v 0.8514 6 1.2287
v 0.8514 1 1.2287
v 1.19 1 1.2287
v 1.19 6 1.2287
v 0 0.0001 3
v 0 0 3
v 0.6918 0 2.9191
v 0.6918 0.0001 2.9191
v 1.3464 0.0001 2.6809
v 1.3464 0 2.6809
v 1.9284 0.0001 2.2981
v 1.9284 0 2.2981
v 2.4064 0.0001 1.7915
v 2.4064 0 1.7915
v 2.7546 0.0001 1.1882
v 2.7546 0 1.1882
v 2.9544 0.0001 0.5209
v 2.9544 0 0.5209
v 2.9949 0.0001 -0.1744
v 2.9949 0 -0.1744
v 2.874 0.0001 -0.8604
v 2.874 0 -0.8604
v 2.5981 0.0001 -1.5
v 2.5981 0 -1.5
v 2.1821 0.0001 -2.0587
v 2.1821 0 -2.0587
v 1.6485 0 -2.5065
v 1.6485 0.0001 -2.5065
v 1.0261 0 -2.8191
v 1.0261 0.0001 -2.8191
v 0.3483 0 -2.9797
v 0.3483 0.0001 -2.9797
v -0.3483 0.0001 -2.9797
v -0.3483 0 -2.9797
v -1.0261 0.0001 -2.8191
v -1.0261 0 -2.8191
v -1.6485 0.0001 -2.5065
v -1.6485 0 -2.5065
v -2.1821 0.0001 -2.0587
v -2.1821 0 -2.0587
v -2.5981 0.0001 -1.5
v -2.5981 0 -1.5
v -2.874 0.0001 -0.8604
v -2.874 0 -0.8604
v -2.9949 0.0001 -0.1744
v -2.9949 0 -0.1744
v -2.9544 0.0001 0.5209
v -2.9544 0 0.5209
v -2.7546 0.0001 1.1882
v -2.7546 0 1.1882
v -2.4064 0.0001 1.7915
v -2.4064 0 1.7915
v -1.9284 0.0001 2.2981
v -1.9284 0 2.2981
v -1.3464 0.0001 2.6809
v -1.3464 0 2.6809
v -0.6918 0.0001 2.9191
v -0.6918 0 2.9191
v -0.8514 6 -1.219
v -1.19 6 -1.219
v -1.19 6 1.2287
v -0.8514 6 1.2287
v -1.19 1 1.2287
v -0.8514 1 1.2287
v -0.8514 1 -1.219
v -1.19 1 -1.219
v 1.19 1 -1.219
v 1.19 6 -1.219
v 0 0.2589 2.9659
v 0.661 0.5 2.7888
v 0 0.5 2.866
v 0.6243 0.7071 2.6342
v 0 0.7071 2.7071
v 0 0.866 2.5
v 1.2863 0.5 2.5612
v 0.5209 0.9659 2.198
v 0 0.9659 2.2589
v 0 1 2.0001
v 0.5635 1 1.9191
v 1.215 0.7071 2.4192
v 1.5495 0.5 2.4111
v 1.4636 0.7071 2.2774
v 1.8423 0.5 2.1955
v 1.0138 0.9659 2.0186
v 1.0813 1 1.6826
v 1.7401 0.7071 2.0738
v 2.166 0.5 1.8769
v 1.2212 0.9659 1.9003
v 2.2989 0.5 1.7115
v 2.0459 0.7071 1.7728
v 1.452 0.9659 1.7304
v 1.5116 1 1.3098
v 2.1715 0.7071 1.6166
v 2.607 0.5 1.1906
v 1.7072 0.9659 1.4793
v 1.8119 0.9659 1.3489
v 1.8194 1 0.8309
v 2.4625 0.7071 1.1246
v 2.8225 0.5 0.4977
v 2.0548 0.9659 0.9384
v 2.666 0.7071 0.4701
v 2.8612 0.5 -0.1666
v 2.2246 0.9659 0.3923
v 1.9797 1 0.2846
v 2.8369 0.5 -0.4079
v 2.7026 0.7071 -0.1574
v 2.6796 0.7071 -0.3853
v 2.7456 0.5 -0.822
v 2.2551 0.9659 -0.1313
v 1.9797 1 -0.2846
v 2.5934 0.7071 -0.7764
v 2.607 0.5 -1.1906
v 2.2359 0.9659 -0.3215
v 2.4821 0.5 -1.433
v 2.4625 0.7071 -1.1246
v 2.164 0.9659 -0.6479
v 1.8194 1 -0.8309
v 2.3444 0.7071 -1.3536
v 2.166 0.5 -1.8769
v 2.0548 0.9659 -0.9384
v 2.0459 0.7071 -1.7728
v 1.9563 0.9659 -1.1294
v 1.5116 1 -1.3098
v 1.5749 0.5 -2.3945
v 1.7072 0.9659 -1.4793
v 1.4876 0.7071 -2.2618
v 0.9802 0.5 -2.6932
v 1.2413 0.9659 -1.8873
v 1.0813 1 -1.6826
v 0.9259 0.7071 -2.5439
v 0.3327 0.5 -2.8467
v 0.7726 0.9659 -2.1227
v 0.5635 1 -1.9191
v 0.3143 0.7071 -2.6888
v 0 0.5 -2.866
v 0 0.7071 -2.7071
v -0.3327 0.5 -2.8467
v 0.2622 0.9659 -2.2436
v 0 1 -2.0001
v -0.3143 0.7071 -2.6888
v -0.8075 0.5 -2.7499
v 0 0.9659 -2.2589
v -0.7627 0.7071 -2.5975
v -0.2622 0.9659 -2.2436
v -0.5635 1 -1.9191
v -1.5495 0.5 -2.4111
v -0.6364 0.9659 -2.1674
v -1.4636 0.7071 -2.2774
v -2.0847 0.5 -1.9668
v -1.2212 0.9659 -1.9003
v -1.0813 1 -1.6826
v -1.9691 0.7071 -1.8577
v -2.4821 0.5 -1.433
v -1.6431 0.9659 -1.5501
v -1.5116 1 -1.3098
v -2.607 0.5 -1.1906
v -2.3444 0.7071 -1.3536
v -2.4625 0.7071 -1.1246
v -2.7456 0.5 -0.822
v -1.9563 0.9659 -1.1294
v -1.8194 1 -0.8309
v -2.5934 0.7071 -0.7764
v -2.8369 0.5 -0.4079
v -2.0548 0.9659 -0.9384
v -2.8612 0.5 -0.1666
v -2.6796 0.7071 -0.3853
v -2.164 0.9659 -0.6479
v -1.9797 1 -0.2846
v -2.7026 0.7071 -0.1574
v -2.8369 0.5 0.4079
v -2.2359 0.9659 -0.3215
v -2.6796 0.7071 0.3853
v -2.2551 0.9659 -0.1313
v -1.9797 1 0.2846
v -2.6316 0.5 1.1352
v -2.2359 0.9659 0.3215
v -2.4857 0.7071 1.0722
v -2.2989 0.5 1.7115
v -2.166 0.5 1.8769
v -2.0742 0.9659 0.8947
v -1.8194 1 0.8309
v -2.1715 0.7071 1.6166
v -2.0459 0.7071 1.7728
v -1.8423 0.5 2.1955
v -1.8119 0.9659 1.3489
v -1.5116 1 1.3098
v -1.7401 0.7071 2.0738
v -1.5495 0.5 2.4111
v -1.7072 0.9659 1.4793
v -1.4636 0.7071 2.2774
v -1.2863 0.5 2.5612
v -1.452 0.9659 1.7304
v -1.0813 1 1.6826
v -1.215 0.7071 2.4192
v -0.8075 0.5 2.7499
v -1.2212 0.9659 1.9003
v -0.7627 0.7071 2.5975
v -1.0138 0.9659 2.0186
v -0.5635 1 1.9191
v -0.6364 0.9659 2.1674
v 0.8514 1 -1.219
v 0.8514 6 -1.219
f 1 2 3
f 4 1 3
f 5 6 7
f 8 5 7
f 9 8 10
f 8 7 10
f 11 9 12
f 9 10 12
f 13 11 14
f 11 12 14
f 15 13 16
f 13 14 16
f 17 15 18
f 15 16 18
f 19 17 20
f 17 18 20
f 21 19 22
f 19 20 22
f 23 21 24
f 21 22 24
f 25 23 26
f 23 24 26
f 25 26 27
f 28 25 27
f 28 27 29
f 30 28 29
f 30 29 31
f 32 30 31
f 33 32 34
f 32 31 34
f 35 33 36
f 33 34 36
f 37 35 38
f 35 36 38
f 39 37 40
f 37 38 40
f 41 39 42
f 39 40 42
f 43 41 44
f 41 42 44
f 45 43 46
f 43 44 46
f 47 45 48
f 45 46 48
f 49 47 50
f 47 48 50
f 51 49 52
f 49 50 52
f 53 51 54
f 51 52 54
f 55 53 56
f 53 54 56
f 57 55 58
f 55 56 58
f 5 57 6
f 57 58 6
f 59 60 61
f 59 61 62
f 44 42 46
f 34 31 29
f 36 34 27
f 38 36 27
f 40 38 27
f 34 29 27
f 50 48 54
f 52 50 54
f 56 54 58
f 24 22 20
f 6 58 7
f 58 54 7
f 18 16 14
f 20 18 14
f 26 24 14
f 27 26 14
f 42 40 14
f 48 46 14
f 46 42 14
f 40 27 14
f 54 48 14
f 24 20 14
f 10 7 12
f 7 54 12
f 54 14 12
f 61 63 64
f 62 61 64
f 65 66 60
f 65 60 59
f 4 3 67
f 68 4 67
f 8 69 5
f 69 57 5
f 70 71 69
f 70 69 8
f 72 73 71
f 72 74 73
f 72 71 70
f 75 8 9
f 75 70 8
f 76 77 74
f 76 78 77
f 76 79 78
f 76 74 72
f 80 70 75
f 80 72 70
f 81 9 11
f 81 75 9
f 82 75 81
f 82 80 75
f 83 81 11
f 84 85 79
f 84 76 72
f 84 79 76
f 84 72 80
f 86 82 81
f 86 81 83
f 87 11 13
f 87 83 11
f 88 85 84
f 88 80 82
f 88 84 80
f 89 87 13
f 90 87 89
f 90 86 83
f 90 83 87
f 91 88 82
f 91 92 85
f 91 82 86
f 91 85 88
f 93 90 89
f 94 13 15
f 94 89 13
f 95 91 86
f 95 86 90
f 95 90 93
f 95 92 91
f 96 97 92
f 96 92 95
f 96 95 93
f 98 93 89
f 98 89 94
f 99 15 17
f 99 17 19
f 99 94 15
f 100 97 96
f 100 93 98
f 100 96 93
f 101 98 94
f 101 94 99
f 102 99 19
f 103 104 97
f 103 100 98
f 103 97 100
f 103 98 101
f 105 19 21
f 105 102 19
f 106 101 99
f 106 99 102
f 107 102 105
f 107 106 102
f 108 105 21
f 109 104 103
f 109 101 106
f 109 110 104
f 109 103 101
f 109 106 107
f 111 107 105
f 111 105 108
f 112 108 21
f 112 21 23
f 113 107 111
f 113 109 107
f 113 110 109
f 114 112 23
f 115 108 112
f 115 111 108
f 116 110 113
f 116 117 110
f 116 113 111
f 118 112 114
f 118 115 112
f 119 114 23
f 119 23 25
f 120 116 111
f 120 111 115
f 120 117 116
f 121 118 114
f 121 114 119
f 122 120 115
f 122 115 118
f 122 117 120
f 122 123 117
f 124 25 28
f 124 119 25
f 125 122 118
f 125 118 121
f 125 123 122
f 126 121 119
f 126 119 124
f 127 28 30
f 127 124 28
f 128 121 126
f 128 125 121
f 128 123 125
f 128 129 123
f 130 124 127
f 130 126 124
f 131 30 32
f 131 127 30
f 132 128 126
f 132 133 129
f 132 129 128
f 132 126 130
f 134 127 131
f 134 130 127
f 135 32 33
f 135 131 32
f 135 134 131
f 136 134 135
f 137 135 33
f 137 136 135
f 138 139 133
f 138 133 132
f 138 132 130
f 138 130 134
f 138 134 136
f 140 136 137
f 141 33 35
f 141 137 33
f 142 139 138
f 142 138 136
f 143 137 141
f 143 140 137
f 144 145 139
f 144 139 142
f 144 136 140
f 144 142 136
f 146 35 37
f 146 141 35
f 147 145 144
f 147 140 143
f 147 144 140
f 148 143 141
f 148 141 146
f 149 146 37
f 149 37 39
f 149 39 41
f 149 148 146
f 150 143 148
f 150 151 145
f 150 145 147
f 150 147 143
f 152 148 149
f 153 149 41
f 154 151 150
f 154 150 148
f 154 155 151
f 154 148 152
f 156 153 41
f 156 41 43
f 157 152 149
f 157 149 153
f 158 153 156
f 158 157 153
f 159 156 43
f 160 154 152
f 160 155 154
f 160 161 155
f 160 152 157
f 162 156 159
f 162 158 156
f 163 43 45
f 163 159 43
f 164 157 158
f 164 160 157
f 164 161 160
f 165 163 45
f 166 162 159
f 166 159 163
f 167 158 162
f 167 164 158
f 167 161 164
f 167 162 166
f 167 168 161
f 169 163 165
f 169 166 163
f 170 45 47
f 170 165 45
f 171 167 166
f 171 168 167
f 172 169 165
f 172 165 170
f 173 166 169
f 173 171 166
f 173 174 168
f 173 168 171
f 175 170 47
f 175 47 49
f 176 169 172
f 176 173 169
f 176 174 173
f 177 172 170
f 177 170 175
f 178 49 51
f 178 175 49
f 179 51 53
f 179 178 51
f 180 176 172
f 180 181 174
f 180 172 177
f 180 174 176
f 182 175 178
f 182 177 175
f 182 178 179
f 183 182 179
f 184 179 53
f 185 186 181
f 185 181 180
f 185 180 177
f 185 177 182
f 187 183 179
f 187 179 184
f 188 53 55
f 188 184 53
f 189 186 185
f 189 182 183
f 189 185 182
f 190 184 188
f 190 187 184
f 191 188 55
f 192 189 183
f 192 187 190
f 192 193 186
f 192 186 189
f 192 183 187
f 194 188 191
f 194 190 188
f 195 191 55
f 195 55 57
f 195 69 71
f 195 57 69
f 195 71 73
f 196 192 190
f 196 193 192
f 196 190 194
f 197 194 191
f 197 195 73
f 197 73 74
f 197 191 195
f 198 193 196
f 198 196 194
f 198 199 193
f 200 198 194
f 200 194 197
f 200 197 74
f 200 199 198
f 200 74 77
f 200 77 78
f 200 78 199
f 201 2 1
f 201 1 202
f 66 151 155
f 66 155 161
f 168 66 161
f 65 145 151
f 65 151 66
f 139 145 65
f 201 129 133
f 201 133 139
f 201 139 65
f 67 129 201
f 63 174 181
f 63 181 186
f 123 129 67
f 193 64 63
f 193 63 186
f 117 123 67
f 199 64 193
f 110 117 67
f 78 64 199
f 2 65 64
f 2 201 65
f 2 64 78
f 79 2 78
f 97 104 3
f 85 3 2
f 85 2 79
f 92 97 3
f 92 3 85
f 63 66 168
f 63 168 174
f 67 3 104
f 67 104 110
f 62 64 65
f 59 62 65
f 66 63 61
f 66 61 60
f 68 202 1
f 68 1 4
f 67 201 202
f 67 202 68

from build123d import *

# Parameters (mm, degrees)
SKETCH1_R           = 3
BOSS_EXTRUDE2_DEPTH = 1
FILLET3_R           = 1
SKETCH4_W           = 0.338616022
SKETCH4_H           = 2.447710107
BOSS_EXTRUDE3_DEPTH = 5


with BuildPart() as part:
    # Sketch1 → Boss-Extrude2 (new body)
    with BuildSketch(Plane(origin=(0, 0, 0), x_dir=(1, 0, 0), z_dir=(0, 1, 0))):
        with Locations(Location((0, 0, 0), (0, 0, 270))):
            Circle(SKETCH1_R)
    extrude(amount=BOSS_EXTRUDE2_DEPTH)

    # Fillet3
    fillet3_edges = [part.edges().sort_by_distance(p)[0] for p in [
        (0, 1, -3),
    ]]
    fillet(fillet3_edges, radius=FILLET3_R - 0.0001)  # a hair under: the kernel refuses the full size

    # Sketch4 → Boss-Extrude3 (add)
    with BuildSketch(Plane(origin=(0, 1, 0), x_dir=(1, 0, 0), z_dir=(0, 1, 0))):
        with Locations((1.02068544, -0.004837371)):
            Rectangle(SKETCH4_W, SKETCH4_H)
        with Locations((-1.02068544, -0.004837371)):
            Rectangle(SKETCH4_W, SKETCH4_H)
    extrude(amount=BOSS_EXTRUDE3_DEPTH)


solid = part.part
